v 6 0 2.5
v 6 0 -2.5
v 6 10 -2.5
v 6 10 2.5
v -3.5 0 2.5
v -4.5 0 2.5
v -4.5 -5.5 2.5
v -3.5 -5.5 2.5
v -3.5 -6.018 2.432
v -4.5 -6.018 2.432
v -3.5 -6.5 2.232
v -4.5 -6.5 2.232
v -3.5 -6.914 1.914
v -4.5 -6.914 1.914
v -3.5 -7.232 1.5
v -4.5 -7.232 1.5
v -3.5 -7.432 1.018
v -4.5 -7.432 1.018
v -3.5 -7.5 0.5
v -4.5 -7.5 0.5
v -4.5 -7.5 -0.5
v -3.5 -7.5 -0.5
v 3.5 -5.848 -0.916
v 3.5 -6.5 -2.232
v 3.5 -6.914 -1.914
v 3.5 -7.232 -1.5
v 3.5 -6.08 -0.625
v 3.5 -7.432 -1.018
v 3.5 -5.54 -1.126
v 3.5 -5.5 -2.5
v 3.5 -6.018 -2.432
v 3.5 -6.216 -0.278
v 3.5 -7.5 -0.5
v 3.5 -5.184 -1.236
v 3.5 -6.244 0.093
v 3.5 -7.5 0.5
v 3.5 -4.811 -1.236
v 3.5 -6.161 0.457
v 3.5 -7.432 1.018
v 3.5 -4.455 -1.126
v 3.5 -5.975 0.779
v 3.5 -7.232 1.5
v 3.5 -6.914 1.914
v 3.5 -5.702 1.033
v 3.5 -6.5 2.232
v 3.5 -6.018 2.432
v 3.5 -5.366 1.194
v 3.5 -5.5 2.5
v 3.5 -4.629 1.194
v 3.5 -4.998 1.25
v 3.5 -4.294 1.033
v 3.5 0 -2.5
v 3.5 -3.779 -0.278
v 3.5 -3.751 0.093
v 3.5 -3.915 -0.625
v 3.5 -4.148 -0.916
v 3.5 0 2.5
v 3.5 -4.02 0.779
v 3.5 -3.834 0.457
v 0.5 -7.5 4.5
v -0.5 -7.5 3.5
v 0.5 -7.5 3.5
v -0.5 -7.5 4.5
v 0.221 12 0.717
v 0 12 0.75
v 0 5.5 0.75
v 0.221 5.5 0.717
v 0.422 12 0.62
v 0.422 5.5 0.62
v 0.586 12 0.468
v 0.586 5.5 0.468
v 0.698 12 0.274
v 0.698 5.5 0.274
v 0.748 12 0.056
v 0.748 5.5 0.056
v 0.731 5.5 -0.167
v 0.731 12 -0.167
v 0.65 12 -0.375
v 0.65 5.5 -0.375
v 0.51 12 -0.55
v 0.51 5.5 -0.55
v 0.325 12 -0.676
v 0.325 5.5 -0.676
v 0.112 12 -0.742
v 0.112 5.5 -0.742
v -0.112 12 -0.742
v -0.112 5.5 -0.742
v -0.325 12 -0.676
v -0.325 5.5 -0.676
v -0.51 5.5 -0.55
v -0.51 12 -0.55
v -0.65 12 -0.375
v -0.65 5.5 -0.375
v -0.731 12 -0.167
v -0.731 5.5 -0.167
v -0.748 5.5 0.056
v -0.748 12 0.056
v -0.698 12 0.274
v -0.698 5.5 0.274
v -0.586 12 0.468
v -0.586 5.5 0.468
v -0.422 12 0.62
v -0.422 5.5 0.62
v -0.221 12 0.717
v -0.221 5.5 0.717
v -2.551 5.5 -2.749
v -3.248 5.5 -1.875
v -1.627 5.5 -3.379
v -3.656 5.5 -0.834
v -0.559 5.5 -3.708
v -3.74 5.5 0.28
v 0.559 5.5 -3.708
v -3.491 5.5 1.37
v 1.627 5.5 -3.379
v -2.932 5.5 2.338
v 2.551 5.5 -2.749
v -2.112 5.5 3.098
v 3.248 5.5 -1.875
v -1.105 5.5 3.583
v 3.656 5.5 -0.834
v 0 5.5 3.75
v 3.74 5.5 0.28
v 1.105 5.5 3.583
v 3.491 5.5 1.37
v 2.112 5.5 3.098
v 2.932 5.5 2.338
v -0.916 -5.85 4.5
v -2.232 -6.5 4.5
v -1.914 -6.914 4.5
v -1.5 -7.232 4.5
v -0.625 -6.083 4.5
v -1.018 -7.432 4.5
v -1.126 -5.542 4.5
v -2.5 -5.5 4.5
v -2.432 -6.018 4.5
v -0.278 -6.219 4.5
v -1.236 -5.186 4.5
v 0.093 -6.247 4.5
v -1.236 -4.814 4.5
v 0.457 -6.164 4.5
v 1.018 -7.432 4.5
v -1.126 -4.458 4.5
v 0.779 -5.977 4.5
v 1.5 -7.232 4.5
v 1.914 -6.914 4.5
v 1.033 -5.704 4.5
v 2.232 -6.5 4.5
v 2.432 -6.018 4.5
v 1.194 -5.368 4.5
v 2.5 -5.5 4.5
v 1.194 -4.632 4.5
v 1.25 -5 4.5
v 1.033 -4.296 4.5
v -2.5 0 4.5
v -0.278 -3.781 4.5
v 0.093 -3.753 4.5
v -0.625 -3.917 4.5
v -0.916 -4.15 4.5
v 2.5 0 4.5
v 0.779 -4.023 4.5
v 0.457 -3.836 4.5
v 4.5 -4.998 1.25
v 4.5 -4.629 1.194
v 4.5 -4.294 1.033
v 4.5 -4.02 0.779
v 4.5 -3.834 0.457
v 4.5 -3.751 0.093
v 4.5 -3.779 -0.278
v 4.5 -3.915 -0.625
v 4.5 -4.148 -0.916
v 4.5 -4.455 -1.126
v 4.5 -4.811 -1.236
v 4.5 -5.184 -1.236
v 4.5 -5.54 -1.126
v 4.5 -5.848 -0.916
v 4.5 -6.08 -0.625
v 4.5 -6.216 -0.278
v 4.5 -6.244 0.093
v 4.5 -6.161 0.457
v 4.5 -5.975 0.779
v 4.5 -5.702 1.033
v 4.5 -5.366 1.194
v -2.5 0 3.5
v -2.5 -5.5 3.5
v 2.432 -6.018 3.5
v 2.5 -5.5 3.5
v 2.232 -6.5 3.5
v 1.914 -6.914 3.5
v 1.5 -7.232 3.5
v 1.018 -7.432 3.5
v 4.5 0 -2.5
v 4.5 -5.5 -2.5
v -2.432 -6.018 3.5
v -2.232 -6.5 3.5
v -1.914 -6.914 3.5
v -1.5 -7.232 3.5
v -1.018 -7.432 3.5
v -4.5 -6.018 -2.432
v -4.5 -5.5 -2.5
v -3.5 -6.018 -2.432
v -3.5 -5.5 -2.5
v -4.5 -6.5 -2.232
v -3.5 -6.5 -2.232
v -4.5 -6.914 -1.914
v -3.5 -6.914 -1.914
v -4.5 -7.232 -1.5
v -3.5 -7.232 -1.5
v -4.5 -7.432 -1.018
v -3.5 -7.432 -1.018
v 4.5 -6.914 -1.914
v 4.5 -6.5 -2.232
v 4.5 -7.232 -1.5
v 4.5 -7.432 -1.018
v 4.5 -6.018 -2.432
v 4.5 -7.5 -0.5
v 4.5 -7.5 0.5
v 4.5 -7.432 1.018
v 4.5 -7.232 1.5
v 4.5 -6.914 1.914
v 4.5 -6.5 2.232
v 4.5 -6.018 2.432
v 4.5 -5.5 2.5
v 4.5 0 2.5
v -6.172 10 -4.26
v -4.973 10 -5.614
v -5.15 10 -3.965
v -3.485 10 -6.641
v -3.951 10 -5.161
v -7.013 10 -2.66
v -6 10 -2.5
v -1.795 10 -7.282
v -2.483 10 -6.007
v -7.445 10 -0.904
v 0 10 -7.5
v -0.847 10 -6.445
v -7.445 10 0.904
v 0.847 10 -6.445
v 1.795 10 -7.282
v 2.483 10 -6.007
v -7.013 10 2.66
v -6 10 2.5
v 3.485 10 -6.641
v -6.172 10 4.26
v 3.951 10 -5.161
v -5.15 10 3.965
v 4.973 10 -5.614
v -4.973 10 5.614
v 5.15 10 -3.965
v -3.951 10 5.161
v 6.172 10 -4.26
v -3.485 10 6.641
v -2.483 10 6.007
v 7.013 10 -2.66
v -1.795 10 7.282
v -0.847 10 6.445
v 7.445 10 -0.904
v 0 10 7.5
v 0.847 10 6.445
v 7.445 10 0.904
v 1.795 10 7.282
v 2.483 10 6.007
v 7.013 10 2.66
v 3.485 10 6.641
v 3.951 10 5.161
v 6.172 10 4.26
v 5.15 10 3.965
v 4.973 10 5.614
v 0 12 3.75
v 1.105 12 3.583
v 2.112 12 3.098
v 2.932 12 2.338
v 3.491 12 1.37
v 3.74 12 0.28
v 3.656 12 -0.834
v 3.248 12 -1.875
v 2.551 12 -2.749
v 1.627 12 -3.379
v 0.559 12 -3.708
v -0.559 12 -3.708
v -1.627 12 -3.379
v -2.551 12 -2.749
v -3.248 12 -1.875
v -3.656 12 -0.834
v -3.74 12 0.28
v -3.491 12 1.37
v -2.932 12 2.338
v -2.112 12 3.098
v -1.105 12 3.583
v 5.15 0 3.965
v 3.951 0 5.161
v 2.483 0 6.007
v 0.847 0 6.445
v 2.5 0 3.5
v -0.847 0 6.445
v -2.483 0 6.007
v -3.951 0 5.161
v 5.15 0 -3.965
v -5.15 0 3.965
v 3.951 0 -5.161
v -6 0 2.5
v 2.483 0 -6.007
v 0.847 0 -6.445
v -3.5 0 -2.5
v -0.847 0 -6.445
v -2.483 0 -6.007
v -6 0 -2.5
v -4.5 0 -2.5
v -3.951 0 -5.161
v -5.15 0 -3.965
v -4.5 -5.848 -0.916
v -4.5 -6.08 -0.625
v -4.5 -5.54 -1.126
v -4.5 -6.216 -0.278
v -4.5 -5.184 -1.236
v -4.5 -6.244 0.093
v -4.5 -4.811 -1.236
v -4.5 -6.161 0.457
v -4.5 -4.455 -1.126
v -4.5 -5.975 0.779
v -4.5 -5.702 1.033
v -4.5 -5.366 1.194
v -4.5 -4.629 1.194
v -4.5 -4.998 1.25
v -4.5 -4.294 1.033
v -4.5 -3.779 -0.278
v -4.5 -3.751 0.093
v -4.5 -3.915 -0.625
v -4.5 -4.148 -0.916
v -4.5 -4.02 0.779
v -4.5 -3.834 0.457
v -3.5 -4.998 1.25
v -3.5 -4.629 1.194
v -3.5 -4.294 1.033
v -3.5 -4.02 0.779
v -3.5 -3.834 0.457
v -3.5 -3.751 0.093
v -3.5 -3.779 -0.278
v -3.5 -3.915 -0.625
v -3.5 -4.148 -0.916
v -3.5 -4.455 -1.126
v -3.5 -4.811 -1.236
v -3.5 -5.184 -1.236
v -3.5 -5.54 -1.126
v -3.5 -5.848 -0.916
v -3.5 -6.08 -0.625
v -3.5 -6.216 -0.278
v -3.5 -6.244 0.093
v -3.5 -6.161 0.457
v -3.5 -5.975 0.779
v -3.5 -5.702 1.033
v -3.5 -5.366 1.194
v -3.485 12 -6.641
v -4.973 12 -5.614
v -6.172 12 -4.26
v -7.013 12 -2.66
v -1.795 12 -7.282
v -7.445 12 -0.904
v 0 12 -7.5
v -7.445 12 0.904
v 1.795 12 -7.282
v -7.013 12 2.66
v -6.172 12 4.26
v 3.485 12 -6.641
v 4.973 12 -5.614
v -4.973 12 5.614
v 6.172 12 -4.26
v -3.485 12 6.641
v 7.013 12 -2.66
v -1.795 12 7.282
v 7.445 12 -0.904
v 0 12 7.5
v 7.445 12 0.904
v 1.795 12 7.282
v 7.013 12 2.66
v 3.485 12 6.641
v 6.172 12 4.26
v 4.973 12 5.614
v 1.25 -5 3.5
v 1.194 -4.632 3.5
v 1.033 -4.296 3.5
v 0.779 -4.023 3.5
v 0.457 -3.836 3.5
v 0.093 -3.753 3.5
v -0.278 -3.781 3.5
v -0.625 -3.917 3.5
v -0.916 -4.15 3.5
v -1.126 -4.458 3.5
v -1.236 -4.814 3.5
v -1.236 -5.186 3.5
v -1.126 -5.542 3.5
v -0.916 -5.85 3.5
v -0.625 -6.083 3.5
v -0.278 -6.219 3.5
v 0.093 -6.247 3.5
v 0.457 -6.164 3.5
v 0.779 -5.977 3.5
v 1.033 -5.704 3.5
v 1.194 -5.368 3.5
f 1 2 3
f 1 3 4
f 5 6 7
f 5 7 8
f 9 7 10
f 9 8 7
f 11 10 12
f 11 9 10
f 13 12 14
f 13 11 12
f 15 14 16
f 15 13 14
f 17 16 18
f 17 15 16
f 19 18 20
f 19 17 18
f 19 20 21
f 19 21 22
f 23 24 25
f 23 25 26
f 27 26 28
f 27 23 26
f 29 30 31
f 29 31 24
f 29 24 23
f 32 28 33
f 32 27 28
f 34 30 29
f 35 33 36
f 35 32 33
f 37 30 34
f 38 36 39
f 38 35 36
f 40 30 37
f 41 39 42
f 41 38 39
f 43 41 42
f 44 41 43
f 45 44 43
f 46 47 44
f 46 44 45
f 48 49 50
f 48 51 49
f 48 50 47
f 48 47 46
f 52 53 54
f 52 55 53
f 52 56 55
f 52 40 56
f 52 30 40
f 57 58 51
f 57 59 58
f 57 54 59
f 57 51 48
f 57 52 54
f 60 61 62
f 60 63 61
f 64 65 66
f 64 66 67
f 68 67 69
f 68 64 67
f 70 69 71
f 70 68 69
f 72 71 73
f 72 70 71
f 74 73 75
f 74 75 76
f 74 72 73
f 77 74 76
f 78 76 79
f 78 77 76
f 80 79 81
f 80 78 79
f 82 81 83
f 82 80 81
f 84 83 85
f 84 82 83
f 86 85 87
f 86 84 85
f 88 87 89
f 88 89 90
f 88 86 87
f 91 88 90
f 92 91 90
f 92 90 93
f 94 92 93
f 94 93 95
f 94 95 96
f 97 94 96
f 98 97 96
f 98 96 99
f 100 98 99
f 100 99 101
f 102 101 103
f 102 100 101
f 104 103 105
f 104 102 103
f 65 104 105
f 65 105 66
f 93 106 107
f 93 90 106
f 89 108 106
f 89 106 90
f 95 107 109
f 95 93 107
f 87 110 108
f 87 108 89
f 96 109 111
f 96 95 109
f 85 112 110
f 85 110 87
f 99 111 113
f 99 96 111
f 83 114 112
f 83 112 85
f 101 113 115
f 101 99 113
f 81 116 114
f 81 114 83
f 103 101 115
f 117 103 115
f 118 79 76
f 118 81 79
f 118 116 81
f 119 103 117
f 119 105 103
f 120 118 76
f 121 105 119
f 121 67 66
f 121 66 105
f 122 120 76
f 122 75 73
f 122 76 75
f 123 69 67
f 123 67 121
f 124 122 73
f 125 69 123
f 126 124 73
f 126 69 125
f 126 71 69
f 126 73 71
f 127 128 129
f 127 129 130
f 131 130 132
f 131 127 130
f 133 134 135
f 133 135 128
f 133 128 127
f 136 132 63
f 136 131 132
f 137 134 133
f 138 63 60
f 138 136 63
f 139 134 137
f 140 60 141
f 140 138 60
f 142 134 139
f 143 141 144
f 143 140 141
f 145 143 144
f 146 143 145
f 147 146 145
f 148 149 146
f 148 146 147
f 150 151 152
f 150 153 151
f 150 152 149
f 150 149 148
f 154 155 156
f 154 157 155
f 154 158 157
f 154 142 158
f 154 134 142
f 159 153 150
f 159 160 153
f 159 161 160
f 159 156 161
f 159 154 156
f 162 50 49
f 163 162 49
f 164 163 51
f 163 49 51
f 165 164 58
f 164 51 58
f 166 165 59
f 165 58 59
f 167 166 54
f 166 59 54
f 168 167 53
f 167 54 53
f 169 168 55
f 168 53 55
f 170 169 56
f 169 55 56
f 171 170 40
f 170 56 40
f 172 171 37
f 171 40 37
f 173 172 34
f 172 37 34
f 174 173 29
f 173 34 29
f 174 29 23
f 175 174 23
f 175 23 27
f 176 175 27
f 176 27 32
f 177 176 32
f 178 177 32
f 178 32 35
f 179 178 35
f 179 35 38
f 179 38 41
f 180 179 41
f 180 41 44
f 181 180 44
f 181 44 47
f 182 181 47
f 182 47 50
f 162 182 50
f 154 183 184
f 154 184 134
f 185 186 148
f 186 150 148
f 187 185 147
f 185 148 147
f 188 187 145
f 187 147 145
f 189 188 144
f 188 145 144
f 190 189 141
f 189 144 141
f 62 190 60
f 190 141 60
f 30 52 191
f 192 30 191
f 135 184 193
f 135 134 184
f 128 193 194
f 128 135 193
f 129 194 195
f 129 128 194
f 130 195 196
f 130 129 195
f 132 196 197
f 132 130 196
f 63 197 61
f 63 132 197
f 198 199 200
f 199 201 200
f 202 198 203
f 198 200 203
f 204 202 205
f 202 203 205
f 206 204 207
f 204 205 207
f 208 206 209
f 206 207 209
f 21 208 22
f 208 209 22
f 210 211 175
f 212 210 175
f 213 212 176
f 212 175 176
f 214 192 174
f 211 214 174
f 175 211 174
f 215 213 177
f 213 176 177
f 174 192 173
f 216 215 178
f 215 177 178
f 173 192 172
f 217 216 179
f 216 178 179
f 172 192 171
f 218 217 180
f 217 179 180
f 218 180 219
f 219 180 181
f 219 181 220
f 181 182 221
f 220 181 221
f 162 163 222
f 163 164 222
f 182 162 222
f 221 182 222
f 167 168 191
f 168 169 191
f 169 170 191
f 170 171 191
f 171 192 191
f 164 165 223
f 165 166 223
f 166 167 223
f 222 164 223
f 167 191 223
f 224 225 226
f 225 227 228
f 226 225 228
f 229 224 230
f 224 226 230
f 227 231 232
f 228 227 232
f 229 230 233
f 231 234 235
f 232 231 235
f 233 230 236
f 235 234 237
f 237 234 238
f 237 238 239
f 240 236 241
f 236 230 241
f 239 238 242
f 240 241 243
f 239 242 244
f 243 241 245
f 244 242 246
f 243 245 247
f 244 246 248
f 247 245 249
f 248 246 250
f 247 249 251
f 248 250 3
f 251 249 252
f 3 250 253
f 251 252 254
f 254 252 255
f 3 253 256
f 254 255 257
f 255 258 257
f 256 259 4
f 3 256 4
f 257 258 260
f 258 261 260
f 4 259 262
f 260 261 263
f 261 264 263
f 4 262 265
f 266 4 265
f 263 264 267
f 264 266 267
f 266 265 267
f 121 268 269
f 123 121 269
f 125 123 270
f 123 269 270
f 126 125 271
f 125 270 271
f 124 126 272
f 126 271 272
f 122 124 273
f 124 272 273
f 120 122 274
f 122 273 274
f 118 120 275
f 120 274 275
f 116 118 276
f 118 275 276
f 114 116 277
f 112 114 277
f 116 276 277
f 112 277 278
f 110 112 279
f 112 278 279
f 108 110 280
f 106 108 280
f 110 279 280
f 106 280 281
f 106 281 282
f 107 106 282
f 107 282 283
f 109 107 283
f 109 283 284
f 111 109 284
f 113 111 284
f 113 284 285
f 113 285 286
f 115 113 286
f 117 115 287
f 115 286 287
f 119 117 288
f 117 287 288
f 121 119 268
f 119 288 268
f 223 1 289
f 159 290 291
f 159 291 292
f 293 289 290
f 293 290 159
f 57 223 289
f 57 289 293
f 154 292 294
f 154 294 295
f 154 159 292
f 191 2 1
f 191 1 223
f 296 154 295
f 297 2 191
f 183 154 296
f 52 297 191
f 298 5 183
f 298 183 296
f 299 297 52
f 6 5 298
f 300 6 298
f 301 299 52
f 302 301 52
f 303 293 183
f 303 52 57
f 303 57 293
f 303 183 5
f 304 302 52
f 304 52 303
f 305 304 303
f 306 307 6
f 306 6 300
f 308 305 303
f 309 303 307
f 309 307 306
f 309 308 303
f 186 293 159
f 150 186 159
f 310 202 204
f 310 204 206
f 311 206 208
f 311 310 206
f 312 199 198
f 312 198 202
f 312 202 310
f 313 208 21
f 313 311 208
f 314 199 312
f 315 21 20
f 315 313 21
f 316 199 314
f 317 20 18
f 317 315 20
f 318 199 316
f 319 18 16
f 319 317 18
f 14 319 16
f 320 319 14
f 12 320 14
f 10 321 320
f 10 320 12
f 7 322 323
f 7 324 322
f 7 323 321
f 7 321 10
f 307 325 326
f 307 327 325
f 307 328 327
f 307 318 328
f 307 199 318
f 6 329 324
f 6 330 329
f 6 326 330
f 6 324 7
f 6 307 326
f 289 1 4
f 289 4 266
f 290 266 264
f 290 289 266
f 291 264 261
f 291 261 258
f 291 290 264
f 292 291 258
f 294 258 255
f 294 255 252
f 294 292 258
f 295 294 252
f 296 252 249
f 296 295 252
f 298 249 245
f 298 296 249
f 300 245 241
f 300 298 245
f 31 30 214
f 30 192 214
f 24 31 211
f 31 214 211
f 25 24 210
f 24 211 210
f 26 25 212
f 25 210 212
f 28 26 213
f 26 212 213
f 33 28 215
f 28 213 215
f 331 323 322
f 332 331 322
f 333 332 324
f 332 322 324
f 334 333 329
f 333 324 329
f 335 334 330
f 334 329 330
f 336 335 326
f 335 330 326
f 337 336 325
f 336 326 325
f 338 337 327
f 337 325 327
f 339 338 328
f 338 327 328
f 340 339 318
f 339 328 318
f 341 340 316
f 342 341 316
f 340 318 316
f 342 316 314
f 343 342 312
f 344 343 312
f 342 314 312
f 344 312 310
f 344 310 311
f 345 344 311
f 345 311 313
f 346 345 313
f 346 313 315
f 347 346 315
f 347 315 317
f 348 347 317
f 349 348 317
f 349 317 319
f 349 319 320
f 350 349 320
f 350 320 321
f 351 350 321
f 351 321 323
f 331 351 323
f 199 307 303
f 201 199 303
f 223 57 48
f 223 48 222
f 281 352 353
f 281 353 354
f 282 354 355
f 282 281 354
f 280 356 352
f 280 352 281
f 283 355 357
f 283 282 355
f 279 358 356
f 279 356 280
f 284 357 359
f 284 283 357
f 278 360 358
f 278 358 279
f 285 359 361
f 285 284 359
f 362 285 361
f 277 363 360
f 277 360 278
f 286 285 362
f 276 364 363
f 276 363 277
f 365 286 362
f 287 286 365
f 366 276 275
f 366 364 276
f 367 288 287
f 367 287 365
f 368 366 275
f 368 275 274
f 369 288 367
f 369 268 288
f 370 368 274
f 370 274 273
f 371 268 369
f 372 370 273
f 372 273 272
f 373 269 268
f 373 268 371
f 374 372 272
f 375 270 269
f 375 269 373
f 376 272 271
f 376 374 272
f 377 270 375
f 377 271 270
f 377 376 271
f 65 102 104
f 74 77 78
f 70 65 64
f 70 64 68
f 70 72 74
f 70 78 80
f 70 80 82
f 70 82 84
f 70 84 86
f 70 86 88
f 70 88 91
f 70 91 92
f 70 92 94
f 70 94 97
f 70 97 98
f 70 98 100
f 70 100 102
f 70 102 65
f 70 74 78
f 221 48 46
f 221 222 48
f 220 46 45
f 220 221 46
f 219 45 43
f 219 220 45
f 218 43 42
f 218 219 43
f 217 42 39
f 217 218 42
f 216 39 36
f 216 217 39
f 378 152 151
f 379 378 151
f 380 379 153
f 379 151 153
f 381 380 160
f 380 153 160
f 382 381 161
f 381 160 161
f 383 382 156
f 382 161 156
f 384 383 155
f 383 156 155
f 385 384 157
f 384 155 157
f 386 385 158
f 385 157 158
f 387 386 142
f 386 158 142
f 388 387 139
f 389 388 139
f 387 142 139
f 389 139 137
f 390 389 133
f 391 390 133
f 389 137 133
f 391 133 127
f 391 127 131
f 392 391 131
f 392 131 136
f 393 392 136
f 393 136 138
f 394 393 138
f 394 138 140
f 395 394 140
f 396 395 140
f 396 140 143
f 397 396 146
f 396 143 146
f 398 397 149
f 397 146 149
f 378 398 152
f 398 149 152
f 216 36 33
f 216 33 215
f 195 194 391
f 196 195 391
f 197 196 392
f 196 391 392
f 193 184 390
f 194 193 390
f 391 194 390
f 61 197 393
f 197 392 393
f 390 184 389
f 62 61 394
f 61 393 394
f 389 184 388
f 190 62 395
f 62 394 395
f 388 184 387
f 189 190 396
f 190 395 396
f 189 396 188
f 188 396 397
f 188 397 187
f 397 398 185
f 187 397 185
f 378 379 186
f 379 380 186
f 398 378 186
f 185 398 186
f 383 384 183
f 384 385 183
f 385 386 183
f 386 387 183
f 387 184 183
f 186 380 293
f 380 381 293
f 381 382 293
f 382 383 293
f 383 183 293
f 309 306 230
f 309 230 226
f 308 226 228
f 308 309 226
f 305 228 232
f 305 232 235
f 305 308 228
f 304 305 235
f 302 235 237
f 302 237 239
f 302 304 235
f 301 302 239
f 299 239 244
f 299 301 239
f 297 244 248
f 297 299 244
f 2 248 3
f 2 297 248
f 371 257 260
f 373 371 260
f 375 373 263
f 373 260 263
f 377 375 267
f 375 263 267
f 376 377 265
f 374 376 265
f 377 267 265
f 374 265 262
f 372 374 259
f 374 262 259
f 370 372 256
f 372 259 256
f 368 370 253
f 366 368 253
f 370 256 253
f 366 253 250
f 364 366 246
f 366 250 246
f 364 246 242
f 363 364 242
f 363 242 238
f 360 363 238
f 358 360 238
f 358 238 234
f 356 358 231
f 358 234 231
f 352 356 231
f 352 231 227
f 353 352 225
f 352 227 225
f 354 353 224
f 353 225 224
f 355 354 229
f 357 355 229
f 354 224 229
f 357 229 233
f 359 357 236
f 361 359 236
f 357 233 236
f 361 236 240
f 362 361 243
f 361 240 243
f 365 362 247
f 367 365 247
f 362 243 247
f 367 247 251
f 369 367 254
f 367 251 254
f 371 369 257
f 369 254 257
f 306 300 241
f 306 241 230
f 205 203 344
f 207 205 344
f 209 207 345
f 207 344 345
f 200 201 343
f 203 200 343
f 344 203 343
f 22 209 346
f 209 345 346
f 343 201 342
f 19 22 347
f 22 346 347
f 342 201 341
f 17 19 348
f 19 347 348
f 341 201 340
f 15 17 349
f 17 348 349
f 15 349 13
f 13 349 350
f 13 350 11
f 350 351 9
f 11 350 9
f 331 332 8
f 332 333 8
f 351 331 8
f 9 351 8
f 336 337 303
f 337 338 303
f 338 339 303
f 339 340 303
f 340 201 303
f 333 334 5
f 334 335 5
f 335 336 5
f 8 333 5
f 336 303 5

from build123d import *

# Parameters (mm, degrees)
SALIENTE_EXTRUIR1_DEPTH = 10
CROQUIS2_R              = 7.5
SALIENTE_EXTRUIR2_DEPTH = 2
CROQUIS3_R              = 3.75
CROQUIS3_R_2            = 0.75
CORTAR_EXTRUIR1_DEPTH   = 6.5
CROQUIS4_W              = 1
CROQUIS4_H              = 5
CROQUIS4_W_2            = 5
CROQUIS4_H_2            = 1
SALIENTE_EXTRUIR3_DEPTH = 7.5
CORTAR_EXTRUIR2_REACH   = 20.554
CROQUIS5_R              = 1.25
CROQUIS6_R              = 1.25
CORTAR_EXTRUIR3_DEPTH   = 1
REDONDEO1_R             = 2


with BuildPart() as part:
    # Croquis1 → Saliente-Extruir1 (new body)
    with BuildSketch(Plane(origin=(0, 0, 0), x_dir=(1, 0, 0), z_dir=(0, 1, 0))):
        with BuildLine():
            Line((6, 2.5), (6, -2.5))
            ThreePointArc((6, -2.5), (0, -6.5), (-6, -2.5))
            Line((-6, -2.5), (-6, 2.5))
            ThreePointArc((-6, 2.5), (0, 6.5), (6, 2.5))
        make_face()
    extrude(amount=SALIENTE_EXTRUIR1_DEPTH)

    # Croquis2 → Saliente-Extruir2 (add)
    with BuildSketch(Plane(origin=(0, 10, 0), x_dir=(1, 0, 0), z_dir=(0, 1, 0))):
        with Locations(Location((0, 0, 0), (0, 0, 270))):
            Circle(CROQUIS2_R)
    extrude(amount=SALIENTE_EXTRUIR2_DEPTH)

    # Croquis3 → Cortar-Extruir1 (cut)
    with BuildSketch(Plane(origin=(0, 12, 0), x_dir=(1, 0, 0), z_dir=(0, 1, 0))):
        with Locations(Location((0, 0, 0), (0, 0, 270))):
            Circle(CROQUIS3_R)
        with Locations(Location((0, 0, 0), (0, 0, 270))):
            Circle(CROQUIS3_R_2, mode=Mode.SUBTRACT)
    extrude(amount=-CORTAR_EXTRUIR1_DEPTH, mode=Mode.SUBTRACT)

    # Croquis4 → Saliente-Extruir3 (add)
    with BuildSketch(Plane.XZ):
        with Locations((-4, 0)):
            Rectangle(CROQUIS4_W, CROQUIS4_H)
        with Locations((4, 0)):
            Rectangle(CROQUIS4_W, CROQUIS4_H)
        with Locations((0, 4)):
            Rectangle(CROQUIS4_W_2, CROQUIS4_H_2)
    extrude(amount=SALIENTE_EXTRUIR3_DEPTH)

    # Cortar-Extruir2: up to this face of the body (flat: up to its plane)
    cortar_extruir2_end = Plane(part.part.faces().sort_by_distance((4.5, -3.75, 0))[0])
    # Croquis5 → Cortar-Extruir2 (cut, up to the picked face)
    with BuildSketch(Plane.ZY.offset(4.5), mode=Mode.PRIVATE) as cortar_extruir2_sk1:
        with Locations((0, -4.997728335)):
            Circle(CROQUIS5_R)
    cortar_extruir2_tool1 = split(extrude(cortar_extruir2_sk1.sketch, amount=-CORTAR_EXTRUIR2_REACH, mode=Mode.PRIVATE), bisect_by=cortar_extruir2_end, keep=Keep.BOTH, mode=Mode.PRIVATE)
    add(cortar_extruir2_tool1.solids().sort_by(Axis((-4.5, -4.997728, 0), (1, 0, 0)))[0], mode=Mode.SUBTRACT)

    # Croquis6 → Cortar-Extruir3 (cut)
    with BuildSketch(Plane.XY.offset(4.5)):
        with Locations((0, -5)):
            Circle(CROQUIS6_R)
    extrude(amount=-CORTAR_EXTRUIR3_DEPTH, mode=Mode.SUBTRACT)

    # Redondeo1
    redondeo1_edges = [part.edges().sort_by_distance(p)[0] for p in [
        (-4, -7.5, 2.5),
        (-4, -7.5, -2.5),
        (4, -7.5, 2.5),
        (4, -7.5, -2.5),
        (2.5, -7.5, 4),
        (-2.5, -7.5, 4),
    ]]
    fillet(redondeo1_edges, radius=REDONDEO1_R)


solid = part.part
